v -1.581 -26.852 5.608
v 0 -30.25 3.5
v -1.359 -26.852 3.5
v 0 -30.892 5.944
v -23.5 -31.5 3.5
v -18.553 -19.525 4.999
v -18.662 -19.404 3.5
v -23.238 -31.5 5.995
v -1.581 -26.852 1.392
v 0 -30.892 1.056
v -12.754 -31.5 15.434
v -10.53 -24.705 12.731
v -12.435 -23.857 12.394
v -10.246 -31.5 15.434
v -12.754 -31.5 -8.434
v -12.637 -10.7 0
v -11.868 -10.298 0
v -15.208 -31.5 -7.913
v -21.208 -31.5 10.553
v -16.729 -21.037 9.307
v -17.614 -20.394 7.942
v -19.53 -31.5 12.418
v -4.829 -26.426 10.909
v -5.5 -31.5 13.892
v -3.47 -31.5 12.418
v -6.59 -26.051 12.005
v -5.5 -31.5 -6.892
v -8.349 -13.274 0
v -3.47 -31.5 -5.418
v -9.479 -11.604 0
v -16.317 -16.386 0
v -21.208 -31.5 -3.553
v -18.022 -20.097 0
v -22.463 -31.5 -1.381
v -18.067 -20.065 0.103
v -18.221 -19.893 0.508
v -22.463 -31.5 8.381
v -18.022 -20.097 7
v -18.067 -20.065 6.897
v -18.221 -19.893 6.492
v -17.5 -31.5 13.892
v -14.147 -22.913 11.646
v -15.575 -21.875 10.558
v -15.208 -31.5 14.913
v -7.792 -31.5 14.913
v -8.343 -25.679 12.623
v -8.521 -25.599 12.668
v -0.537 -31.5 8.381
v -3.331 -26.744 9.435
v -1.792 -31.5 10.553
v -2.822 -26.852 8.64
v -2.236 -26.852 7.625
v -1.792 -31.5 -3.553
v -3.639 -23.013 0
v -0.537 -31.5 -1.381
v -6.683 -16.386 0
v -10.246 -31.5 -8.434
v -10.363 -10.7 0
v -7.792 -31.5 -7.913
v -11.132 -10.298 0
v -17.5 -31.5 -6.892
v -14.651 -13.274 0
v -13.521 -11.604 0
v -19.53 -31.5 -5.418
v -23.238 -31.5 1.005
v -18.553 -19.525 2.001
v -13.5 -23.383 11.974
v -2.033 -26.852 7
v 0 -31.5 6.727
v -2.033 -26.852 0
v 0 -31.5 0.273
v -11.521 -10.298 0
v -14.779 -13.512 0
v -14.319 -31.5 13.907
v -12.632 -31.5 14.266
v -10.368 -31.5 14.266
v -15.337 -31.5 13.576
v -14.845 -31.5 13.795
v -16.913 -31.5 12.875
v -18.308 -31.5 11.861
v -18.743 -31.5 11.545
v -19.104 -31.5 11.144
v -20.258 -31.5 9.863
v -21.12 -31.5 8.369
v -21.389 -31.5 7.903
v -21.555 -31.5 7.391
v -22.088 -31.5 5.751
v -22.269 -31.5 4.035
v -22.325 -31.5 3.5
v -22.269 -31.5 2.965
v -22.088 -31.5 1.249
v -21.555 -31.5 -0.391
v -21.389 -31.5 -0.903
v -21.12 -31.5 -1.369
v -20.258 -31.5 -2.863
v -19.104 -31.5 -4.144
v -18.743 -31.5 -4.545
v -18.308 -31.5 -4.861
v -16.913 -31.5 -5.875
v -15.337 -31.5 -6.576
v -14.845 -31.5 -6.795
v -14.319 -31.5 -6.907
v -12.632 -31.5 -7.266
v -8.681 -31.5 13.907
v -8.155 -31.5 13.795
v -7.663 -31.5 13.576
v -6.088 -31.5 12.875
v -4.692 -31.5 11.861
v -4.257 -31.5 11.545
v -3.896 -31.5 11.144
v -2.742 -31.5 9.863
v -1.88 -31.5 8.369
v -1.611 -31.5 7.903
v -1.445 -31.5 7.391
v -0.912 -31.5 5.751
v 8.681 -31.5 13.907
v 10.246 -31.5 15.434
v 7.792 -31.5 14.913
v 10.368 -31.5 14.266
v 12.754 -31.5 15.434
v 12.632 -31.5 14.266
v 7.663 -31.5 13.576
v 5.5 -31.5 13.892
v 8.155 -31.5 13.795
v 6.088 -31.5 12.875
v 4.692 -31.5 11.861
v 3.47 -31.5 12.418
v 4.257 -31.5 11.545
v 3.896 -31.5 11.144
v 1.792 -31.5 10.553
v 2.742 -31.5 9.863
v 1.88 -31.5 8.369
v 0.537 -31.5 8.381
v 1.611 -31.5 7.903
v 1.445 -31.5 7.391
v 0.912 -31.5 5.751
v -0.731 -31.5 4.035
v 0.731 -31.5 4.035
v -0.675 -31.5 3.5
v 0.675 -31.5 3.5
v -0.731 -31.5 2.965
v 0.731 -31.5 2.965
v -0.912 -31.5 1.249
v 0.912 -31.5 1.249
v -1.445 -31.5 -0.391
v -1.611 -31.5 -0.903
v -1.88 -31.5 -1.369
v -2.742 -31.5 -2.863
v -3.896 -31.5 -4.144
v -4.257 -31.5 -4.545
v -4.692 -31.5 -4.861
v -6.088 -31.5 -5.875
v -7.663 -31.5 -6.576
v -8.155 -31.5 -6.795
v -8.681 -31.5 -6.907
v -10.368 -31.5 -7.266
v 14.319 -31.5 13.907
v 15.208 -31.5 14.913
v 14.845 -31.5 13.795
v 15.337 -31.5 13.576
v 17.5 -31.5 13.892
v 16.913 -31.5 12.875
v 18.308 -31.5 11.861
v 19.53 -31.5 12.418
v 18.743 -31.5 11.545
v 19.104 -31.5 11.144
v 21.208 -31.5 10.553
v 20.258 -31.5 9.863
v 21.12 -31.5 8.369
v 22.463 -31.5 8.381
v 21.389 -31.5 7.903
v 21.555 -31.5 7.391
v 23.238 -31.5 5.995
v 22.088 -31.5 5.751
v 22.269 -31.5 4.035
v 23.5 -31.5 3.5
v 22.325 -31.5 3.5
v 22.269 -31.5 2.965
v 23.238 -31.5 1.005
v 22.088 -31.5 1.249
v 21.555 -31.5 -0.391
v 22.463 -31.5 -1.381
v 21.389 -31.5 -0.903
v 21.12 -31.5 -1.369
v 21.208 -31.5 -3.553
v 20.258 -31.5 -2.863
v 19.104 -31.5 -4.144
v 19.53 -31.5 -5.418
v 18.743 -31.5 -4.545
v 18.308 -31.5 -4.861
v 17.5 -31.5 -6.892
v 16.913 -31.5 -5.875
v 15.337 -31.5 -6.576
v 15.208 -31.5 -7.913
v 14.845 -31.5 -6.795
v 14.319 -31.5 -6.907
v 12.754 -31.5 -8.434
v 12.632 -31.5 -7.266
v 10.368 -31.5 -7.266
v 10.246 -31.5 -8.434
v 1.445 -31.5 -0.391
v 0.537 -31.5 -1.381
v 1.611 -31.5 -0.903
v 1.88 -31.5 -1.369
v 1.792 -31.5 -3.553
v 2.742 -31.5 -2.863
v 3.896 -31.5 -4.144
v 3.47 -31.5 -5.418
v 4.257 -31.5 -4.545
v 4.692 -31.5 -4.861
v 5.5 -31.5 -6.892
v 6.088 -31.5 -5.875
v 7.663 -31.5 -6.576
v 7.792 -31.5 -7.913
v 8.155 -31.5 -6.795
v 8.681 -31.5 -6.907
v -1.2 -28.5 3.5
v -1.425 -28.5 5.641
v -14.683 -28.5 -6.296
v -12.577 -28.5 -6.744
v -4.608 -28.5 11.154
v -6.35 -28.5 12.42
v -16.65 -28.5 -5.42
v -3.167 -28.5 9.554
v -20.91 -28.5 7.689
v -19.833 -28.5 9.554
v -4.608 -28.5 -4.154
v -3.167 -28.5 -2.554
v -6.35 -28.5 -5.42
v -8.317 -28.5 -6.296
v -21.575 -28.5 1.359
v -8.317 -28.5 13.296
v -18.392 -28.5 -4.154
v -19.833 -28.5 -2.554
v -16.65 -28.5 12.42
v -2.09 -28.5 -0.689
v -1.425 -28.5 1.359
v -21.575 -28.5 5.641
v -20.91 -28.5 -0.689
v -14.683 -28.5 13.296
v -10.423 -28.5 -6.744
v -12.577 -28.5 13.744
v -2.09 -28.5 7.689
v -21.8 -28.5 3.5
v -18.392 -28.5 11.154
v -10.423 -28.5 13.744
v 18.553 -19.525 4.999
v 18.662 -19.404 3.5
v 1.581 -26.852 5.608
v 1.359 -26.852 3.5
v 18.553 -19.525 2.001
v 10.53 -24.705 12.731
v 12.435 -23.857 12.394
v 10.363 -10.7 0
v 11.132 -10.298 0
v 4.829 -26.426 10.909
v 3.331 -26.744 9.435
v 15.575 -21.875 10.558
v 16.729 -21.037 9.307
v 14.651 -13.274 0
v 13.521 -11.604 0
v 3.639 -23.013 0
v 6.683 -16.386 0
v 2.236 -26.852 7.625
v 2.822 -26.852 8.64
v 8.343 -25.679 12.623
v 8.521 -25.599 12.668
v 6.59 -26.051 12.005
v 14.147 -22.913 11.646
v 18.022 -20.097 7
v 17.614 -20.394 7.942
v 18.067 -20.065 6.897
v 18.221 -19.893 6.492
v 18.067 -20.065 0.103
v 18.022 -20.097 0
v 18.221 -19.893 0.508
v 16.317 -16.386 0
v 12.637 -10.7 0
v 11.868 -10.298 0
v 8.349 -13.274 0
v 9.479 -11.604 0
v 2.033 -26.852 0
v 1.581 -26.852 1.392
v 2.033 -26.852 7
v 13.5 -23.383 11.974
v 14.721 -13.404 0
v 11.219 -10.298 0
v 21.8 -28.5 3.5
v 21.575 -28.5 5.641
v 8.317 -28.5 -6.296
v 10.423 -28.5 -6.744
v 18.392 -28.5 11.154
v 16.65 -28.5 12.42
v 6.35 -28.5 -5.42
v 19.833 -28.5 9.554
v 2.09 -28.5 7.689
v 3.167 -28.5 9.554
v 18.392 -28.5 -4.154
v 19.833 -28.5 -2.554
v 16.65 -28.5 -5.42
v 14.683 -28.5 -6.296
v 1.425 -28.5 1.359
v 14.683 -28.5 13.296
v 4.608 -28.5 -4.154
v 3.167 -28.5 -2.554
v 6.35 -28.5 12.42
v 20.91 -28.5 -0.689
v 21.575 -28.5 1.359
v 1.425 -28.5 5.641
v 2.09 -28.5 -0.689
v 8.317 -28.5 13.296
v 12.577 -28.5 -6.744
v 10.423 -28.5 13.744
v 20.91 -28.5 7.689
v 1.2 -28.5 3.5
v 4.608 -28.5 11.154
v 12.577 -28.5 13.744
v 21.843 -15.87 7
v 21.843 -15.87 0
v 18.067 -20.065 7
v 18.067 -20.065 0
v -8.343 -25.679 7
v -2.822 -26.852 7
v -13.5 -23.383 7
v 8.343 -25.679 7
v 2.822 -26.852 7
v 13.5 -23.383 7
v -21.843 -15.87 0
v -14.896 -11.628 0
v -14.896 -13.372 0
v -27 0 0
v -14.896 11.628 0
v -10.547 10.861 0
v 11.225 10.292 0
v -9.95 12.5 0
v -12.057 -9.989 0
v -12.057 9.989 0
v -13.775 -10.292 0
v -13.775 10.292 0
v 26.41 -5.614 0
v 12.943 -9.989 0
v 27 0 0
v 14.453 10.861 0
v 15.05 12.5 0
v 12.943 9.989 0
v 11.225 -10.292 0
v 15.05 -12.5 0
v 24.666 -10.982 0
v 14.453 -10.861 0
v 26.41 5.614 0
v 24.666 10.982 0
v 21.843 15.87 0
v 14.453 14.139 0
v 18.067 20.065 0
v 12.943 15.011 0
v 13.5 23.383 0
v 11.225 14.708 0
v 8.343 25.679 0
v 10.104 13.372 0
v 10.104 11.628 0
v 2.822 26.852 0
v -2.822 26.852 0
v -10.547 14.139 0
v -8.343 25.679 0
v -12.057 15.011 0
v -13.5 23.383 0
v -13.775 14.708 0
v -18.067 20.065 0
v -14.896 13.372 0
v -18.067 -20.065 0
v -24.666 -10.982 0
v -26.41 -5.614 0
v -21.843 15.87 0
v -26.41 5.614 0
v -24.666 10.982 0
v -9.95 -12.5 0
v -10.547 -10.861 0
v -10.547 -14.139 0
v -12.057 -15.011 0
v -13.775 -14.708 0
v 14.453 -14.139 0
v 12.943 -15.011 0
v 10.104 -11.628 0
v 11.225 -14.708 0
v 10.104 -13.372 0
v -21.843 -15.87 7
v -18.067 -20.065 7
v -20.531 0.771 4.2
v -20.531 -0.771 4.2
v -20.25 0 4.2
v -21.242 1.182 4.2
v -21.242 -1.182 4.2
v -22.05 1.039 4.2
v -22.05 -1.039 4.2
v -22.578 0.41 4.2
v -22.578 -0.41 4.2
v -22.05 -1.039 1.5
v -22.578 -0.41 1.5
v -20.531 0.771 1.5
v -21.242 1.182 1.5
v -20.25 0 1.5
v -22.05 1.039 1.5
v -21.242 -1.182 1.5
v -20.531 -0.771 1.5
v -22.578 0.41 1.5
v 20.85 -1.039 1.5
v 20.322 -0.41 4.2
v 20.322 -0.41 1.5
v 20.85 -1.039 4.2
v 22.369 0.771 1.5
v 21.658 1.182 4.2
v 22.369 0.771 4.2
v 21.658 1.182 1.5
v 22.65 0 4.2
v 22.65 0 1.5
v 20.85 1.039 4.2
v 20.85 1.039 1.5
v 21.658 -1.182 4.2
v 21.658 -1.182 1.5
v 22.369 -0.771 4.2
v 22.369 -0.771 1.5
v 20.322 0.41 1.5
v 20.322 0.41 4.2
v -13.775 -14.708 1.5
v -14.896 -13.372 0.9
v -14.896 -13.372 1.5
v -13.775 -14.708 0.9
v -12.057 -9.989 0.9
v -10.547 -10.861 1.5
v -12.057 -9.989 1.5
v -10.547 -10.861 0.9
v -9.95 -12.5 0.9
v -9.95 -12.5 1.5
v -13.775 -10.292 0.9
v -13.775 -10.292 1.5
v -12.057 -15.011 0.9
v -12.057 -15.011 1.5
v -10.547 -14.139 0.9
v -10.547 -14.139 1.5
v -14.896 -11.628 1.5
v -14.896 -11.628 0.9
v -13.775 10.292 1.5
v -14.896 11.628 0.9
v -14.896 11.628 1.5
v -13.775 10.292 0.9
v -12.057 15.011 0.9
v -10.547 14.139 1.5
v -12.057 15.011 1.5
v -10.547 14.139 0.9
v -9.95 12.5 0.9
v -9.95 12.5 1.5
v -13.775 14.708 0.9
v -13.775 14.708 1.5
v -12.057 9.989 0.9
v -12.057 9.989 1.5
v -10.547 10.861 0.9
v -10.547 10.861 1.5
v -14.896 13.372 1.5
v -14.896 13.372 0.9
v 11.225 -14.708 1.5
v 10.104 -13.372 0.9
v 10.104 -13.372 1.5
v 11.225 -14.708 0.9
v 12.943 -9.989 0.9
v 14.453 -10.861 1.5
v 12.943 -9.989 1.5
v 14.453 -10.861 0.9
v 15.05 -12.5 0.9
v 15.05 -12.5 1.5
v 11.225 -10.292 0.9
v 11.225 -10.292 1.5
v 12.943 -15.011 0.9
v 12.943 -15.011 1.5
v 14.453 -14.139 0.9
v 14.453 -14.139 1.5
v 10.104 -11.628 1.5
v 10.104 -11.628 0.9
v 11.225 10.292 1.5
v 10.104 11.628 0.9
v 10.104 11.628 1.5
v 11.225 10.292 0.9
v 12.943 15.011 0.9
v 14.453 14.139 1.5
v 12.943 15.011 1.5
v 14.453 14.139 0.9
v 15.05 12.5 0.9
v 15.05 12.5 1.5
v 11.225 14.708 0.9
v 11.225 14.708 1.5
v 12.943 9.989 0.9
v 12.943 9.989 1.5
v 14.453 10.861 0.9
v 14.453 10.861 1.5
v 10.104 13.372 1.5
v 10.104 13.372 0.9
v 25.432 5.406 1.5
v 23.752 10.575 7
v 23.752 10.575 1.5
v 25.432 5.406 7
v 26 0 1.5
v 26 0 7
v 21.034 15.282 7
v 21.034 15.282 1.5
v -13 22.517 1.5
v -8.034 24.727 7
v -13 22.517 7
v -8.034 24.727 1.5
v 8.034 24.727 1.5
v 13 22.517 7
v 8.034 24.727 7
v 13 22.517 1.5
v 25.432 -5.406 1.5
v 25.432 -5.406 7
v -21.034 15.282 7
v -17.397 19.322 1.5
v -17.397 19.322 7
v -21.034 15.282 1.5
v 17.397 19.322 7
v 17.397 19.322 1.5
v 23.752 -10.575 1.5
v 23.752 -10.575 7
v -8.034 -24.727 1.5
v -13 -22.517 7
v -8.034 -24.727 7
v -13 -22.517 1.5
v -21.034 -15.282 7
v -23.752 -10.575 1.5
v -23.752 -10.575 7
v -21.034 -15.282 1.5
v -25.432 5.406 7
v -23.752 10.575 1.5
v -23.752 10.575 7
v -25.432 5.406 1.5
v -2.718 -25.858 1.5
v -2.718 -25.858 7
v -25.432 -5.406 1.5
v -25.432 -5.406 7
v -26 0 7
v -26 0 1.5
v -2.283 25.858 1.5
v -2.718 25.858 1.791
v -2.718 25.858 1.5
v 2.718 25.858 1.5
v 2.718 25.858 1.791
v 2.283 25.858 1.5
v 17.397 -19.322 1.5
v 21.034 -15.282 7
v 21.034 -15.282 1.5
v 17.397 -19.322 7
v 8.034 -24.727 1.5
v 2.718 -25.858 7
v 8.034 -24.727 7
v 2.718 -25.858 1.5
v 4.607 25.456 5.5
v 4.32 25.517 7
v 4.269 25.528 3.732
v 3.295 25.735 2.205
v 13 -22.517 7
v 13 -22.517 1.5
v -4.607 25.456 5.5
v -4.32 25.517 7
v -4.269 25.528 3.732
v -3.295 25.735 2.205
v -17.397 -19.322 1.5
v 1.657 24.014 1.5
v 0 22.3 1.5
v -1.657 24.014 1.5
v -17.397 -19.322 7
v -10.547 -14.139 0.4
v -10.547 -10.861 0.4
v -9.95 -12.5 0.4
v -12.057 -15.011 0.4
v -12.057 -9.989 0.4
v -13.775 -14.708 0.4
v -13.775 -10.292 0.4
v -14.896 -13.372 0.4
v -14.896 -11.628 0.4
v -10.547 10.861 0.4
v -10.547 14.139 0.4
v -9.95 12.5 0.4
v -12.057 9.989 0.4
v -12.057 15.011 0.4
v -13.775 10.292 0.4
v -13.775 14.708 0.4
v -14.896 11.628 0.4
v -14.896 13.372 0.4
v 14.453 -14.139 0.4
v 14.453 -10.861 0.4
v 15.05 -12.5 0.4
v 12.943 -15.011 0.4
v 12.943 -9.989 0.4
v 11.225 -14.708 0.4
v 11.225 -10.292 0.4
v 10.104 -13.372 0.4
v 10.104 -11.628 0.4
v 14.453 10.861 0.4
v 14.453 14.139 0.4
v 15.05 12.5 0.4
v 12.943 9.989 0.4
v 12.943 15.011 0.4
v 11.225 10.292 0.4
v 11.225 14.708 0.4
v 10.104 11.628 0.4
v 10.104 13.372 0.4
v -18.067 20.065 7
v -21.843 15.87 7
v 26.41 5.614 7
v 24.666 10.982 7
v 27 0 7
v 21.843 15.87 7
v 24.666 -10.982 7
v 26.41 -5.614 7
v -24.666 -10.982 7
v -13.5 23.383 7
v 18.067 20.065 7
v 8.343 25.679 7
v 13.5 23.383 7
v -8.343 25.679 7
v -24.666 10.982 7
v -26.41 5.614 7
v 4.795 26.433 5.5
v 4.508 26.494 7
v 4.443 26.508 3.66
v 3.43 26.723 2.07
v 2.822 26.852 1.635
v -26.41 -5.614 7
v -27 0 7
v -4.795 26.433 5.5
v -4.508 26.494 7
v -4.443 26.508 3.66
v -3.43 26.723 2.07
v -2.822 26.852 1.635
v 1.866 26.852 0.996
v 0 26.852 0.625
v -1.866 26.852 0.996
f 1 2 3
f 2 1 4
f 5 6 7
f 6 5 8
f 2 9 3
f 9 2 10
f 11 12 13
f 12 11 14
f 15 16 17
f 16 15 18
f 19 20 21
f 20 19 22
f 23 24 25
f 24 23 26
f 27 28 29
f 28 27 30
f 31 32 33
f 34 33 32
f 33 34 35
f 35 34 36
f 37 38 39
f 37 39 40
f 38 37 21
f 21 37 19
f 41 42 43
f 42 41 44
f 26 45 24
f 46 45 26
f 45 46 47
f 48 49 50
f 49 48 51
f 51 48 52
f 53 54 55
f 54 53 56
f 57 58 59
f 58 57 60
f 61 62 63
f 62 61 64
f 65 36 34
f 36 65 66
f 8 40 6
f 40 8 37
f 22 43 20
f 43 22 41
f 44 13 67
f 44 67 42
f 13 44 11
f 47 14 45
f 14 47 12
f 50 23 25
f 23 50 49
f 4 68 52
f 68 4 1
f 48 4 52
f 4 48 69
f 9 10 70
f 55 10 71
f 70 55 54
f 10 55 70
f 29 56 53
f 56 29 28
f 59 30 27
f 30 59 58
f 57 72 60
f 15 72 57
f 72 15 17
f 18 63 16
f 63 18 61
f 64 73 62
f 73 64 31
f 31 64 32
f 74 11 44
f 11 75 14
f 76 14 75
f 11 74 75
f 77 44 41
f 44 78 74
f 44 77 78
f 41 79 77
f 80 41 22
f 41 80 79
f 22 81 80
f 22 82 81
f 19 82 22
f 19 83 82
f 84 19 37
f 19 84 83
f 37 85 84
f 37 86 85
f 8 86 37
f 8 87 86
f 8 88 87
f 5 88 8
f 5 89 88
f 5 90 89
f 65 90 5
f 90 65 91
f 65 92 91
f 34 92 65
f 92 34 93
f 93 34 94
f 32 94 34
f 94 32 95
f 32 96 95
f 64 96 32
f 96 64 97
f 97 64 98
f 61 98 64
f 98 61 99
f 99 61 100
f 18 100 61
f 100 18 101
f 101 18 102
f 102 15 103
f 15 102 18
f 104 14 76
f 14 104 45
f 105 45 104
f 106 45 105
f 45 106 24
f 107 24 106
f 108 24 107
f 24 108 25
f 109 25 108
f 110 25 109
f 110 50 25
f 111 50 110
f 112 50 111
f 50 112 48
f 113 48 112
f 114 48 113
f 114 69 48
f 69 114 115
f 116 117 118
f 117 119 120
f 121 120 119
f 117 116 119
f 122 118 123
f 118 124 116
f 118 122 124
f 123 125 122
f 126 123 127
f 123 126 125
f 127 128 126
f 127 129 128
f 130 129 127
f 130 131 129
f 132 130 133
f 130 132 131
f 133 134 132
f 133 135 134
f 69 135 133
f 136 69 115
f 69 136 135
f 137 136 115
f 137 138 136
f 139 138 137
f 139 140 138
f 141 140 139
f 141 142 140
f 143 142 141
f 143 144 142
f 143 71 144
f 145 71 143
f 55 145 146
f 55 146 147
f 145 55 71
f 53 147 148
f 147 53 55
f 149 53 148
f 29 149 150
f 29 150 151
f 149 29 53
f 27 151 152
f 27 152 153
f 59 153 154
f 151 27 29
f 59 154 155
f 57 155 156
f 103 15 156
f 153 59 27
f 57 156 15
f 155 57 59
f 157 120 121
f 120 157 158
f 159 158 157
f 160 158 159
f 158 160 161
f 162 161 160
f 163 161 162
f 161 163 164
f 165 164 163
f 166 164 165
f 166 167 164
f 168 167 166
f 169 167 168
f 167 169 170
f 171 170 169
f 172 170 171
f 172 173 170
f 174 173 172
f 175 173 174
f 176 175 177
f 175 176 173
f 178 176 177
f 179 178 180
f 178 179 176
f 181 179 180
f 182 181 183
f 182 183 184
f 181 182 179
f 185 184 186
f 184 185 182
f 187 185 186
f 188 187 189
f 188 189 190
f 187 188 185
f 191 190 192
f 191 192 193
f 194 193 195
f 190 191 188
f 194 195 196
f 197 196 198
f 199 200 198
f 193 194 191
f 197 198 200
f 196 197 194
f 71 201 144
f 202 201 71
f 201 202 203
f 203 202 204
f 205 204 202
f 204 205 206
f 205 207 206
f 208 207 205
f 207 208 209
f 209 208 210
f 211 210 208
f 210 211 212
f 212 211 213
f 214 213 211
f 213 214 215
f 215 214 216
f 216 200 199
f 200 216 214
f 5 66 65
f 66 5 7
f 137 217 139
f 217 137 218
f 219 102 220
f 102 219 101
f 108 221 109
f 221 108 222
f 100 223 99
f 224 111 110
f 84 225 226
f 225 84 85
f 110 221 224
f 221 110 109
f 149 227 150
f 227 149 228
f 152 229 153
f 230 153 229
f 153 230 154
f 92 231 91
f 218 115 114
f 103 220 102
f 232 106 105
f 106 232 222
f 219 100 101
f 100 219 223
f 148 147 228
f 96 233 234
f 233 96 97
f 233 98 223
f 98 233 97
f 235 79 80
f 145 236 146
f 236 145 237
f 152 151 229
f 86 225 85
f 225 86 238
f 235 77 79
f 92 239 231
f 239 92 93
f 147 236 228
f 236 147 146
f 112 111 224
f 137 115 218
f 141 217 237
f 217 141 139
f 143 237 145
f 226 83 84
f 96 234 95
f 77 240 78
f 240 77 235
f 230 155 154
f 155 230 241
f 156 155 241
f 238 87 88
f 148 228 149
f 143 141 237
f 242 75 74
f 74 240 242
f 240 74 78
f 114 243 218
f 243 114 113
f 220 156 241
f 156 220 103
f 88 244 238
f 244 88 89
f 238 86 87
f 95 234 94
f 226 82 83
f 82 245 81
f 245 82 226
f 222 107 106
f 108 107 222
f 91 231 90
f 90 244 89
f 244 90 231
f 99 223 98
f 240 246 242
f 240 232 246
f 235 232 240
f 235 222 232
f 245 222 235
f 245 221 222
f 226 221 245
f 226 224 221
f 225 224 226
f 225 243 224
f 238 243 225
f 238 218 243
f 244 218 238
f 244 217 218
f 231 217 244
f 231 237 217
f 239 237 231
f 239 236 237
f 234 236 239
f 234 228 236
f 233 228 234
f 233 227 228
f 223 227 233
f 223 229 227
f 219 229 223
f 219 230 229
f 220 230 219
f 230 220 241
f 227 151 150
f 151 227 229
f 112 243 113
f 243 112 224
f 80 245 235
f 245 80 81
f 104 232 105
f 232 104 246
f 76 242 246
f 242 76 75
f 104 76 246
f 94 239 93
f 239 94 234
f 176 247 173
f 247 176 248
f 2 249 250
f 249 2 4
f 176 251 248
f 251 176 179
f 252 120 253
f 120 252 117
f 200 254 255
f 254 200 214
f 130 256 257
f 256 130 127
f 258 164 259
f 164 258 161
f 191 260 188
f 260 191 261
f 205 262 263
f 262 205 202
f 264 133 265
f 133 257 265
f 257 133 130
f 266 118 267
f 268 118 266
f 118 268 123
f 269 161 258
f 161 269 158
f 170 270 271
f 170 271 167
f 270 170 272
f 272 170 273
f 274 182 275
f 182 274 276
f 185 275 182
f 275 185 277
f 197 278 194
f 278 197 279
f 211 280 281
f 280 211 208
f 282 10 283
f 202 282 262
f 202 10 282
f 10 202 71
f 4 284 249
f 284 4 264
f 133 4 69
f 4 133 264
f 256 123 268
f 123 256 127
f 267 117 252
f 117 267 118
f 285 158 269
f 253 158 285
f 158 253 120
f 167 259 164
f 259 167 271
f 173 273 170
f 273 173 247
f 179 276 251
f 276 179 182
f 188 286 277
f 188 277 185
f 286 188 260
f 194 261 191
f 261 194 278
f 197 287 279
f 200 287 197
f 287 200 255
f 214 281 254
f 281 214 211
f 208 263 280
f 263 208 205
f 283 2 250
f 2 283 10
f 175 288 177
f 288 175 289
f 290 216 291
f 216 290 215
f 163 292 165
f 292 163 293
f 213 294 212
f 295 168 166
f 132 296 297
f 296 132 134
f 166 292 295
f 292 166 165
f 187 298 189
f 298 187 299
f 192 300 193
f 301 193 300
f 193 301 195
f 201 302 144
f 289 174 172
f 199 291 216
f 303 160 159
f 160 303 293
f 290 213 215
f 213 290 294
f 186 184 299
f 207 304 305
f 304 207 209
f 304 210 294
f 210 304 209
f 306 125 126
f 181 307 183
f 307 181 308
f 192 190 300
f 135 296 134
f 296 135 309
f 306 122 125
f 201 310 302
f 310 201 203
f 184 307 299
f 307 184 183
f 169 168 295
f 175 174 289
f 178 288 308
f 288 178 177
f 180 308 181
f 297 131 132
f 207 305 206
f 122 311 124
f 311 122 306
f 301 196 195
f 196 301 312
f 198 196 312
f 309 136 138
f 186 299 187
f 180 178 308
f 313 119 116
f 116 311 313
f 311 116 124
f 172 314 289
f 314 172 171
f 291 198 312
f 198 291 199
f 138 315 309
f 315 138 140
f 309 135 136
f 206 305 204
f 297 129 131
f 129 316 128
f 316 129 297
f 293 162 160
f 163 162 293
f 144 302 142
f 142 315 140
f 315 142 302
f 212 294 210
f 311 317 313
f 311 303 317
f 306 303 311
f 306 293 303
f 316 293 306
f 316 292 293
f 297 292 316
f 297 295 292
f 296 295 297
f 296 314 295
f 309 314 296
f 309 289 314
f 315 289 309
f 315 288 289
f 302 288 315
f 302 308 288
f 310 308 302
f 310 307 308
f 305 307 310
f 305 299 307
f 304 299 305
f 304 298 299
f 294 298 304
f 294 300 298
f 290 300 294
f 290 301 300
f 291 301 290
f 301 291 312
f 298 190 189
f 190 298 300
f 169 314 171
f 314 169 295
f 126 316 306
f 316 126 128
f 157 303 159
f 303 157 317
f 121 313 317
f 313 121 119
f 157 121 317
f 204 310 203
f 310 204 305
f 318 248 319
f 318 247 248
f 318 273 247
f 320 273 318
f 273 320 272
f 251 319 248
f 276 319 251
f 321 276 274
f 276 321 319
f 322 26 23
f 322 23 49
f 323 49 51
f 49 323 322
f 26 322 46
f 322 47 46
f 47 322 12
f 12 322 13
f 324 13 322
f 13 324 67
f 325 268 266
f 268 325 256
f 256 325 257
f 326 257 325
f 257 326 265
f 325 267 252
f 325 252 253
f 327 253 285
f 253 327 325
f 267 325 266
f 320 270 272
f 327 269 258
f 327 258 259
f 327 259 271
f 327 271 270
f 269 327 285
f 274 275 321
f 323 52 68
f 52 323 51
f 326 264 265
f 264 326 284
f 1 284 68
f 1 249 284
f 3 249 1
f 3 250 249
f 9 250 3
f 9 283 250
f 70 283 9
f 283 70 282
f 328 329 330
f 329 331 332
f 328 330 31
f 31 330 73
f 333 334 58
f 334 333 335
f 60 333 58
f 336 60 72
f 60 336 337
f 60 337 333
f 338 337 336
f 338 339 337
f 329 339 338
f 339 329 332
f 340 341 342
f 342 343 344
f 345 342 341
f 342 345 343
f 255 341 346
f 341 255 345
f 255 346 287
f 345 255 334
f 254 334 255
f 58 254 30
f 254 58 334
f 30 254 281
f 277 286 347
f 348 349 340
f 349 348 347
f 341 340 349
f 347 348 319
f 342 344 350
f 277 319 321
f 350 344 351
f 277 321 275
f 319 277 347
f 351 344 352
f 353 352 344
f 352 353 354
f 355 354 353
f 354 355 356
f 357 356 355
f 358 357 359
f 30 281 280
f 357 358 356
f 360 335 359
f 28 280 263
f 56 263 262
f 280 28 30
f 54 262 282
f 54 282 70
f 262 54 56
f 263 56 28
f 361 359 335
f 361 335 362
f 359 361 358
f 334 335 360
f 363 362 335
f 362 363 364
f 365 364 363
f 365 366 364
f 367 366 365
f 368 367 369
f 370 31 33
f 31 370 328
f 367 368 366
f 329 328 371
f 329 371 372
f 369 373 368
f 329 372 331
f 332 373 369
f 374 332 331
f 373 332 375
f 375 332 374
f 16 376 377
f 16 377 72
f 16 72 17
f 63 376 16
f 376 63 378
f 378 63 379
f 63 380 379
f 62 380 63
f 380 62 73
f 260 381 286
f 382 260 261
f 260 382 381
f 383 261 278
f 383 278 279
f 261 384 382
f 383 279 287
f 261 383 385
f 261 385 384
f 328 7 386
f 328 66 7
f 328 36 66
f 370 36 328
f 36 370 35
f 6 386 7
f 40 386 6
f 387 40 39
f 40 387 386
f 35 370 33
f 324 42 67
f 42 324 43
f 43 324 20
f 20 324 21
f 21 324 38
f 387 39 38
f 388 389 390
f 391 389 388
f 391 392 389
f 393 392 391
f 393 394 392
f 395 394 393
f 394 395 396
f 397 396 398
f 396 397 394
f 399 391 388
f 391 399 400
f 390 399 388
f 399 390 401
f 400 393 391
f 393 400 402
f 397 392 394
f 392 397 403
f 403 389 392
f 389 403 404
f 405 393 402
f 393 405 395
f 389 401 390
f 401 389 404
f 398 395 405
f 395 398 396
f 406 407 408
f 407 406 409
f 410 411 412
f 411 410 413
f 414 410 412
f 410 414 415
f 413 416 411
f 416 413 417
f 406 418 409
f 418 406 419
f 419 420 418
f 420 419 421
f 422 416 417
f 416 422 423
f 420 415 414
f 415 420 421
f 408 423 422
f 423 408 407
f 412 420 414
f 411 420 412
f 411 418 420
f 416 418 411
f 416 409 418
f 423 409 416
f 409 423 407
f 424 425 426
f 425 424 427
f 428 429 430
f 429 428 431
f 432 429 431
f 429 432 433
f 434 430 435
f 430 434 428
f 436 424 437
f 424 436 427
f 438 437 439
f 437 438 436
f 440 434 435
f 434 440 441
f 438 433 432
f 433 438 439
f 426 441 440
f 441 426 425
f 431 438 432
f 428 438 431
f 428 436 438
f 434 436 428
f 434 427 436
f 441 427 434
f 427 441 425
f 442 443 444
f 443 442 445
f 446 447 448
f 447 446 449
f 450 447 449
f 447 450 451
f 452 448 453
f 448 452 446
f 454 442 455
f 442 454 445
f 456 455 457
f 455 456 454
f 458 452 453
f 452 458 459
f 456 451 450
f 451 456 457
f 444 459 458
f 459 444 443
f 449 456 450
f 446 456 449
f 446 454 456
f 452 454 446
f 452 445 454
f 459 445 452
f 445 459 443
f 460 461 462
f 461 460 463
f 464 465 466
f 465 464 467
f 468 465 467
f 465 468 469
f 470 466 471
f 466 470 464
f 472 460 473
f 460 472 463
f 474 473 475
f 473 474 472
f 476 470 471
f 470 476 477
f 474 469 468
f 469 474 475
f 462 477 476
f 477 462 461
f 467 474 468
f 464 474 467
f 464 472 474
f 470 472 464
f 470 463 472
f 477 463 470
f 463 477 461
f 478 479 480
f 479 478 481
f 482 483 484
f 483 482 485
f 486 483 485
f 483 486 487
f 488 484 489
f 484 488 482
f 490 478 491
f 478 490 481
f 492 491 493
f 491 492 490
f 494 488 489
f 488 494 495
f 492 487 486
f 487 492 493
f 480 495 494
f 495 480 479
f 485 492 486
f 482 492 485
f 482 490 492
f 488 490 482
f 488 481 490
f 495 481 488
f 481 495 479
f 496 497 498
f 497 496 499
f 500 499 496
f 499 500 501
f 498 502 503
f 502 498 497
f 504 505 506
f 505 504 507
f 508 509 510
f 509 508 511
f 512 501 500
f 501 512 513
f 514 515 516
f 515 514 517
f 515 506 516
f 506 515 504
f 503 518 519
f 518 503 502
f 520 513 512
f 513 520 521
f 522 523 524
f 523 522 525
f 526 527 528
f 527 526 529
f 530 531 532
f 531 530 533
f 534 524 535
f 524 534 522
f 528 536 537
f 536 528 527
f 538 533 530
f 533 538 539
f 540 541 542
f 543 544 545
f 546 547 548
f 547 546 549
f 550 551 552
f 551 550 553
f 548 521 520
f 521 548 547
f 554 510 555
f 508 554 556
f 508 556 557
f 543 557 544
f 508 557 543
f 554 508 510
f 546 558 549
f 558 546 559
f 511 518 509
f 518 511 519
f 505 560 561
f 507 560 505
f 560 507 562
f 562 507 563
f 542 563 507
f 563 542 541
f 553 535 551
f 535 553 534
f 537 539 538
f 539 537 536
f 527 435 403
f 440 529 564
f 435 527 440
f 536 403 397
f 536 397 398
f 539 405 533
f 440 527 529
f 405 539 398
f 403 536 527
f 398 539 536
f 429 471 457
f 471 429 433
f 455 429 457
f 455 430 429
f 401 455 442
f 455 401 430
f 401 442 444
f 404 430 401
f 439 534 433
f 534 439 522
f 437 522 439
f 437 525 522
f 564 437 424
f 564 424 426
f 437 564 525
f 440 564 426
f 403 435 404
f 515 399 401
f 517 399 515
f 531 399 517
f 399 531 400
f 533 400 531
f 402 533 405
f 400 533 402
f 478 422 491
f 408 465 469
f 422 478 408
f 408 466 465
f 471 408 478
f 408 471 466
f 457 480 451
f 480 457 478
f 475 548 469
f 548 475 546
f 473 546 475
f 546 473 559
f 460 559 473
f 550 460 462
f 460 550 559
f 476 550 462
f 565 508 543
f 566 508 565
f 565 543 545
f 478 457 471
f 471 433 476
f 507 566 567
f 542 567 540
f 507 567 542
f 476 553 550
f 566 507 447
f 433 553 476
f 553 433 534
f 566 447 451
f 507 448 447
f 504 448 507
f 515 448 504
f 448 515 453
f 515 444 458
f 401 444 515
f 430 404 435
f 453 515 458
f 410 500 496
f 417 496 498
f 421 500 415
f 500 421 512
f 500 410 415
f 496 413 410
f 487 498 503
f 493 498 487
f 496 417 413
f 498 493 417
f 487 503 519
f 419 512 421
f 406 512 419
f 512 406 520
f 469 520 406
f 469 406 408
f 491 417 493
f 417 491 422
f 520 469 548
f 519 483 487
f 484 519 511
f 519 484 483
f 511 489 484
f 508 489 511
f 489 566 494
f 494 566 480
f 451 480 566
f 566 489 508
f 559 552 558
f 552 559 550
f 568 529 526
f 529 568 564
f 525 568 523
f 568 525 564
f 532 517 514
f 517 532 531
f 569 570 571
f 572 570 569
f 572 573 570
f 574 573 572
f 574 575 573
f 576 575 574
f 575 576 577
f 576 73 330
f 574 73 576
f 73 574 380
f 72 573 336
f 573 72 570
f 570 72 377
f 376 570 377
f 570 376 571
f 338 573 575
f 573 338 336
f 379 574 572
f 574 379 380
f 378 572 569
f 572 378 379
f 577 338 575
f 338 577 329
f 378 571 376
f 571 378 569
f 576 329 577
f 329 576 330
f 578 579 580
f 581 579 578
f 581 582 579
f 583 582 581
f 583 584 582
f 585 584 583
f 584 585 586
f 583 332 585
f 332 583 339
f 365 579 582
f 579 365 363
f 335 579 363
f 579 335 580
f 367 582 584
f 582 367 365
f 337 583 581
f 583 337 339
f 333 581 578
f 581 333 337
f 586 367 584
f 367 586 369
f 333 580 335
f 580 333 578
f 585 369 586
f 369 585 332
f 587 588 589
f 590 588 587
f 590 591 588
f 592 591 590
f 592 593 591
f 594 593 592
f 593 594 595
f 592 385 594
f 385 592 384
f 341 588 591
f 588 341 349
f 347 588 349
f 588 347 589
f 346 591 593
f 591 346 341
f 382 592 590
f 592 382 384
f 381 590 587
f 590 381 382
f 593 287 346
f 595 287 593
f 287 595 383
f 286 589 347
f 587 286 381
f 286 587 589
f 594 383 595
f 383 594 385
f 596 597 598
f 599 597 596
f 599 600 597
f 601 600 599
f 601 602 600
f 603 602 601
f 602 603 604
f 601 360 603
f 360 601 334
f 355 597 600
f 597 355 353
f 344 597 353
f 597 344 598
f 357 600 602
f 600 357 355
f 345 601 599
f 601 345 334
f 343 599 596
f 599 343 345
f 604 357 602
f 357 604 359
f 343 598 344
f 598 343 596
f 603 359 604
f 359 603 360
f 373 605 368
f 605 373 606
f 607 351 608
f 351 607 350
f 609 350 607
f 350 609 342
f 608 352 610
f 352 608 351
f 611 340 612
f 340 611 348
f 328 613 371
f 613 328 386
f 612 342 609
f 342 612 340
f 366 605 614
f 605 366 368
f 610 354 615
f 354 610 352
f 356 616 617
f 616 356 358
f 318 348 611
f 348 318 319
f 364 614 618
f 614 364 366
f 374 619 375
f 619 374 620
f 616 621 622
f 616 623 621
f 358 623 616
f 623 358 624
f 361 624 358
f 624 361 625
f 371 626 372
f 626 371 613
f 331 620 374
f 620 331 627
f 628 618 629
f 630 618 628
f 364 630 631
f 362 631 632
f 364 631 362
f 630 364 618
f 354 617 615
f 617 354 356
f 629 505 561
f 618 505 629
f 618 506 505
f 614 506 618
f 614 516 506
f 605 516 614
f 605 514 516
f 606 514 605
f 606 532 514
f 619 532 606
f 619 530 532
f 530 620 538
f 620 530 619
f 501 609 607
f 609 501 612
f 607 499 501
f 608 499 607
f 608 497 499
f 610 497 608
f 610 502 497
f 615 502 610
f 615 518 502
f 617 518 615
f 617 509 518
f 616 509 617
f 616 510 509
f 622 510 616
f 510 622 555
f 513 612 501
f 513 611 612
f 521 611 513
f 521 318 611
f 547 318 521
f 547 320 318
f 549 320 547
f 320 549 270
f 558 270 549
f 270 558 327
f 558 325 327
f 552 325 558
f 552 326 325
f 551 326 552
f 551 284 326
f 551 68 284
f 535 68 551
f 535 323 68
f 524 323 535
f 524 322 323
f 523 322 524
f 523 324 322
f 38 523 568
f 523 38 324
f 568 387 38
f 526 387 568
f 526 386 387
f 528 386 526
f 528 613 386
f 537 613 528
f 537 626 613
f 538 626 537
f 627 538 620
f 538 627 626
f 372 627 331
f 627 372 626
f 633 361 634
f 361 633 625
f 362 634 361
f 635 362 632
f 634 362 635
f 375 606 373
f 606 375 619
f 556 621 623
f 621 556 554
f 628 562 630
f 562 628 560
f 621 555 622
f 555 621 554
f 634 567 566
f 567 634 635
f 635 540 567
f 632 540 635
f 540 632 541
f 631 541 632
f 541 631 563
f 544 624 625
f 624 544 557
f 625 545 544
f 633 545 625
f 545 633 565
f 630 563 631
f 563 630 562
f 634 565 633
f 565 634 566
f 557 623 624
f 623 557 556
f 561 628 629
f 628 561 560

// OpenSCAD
// Wrist handlight 4 great awesomeness
// Print revision 6

base_radius = 27;
base_height = 7;
lilypad_radius = 26;
lilypad_heigth = 7;
lilypad_offset_z = 1.5;
lilypad_usb_radius = 5;
lilypad_peg_radius = 1.2;
lilypad_peg_height = 4.2;
lilypad_peg_circumference = 41.7;

rgb_pad_radius = 12;
rgb_pad_offset = 11.5;
rgb_pad_height = 4;

resolution = 9;

magnet_diameter = 2.55;
magnet_height = 0.4;
magnet_height_spacing = 0.5;
magnet_offset = 25;

// rgb_pads
difference(){
     for(pad_i = [0 : 1 : 1]){
          rotate([90]){
               translate([(-(rgb_pad_offset) +(pad_i *rgb_pad_offset)*2), lilypad_heigth/2, lilypad_offset_z]){
                    difference(){
                         cylinder(lilypad_radius + rgb_pad_height, 0, rgb_pad_radius);
                         translate([0,0,base_radius]){
                              cylinder(rgb_pad_height, rgb_pad_radius-1.7, rgb_pad_radius-1);
                         }

                    }
               }
          }
     }
     translate([0,0,0]){
          cylinder(base_height*4, base_radius, base_radius);
     };
}

// Lilypad-pegs
for(x = [0 : 1 : 1]){
     translate([-(lilypad_peg_circumference + lilypad_peg_radius)/2 + x*(lilypad_peg_circumference + lilypad_peg_radius),0,0]){
          cylinder(lilypad_peg_height, lilypad_peg_radius, lilypad_peg_radius, $fn=resolution, $fn=resolution);
     }
}

difference(){
     // base
     cylinder(base_height, base_radius, base_radius);
     // lilypad-via + inner magnets
     union(){
     translate([0, 0,lilypad_offset_z]){
          cylinder(lilypad_heigth, lilypad_radius, lilypad_radius);

     }
     for(x = [0 : 1 : 1]){
          for(y = [0 : 1 : 1]){
               translate([-magnet_offset/2 + x*magnet_offset, -magnet_offset/2 + y*magnet_offset, magnet_height + magnet_height_spacing]){
                    cylinder(magnet_height*2, magnet_diameter, magnet_diameter);
               }
          }
     }

     }
     // magnets
     for(x = [0 : 1 : 1]){
          for(y = [0 : 1 : 1]){
               translate([-magnet_offset/2 + x*magnet_offset, -magnet_offset/2 + y*magnet_offset, 0]){
                    cylinder(magnet_height, magnet_diameter, magnet_diameter);
               }
          }
     }


     // usb-via
     translate([0, 0,lilypad_offset_z]){
          cylinder(lilypad_heigth, lilypad_radius, lilypad_radius);
     }
     rotate([-90]){
          translate([0, -lilypad_heigth+ lilypad_offset_z, lilypad_offset_z]){
               cylinder(lilypad_radius, 0, lilypad_usb_radius);
          }
     }
}
